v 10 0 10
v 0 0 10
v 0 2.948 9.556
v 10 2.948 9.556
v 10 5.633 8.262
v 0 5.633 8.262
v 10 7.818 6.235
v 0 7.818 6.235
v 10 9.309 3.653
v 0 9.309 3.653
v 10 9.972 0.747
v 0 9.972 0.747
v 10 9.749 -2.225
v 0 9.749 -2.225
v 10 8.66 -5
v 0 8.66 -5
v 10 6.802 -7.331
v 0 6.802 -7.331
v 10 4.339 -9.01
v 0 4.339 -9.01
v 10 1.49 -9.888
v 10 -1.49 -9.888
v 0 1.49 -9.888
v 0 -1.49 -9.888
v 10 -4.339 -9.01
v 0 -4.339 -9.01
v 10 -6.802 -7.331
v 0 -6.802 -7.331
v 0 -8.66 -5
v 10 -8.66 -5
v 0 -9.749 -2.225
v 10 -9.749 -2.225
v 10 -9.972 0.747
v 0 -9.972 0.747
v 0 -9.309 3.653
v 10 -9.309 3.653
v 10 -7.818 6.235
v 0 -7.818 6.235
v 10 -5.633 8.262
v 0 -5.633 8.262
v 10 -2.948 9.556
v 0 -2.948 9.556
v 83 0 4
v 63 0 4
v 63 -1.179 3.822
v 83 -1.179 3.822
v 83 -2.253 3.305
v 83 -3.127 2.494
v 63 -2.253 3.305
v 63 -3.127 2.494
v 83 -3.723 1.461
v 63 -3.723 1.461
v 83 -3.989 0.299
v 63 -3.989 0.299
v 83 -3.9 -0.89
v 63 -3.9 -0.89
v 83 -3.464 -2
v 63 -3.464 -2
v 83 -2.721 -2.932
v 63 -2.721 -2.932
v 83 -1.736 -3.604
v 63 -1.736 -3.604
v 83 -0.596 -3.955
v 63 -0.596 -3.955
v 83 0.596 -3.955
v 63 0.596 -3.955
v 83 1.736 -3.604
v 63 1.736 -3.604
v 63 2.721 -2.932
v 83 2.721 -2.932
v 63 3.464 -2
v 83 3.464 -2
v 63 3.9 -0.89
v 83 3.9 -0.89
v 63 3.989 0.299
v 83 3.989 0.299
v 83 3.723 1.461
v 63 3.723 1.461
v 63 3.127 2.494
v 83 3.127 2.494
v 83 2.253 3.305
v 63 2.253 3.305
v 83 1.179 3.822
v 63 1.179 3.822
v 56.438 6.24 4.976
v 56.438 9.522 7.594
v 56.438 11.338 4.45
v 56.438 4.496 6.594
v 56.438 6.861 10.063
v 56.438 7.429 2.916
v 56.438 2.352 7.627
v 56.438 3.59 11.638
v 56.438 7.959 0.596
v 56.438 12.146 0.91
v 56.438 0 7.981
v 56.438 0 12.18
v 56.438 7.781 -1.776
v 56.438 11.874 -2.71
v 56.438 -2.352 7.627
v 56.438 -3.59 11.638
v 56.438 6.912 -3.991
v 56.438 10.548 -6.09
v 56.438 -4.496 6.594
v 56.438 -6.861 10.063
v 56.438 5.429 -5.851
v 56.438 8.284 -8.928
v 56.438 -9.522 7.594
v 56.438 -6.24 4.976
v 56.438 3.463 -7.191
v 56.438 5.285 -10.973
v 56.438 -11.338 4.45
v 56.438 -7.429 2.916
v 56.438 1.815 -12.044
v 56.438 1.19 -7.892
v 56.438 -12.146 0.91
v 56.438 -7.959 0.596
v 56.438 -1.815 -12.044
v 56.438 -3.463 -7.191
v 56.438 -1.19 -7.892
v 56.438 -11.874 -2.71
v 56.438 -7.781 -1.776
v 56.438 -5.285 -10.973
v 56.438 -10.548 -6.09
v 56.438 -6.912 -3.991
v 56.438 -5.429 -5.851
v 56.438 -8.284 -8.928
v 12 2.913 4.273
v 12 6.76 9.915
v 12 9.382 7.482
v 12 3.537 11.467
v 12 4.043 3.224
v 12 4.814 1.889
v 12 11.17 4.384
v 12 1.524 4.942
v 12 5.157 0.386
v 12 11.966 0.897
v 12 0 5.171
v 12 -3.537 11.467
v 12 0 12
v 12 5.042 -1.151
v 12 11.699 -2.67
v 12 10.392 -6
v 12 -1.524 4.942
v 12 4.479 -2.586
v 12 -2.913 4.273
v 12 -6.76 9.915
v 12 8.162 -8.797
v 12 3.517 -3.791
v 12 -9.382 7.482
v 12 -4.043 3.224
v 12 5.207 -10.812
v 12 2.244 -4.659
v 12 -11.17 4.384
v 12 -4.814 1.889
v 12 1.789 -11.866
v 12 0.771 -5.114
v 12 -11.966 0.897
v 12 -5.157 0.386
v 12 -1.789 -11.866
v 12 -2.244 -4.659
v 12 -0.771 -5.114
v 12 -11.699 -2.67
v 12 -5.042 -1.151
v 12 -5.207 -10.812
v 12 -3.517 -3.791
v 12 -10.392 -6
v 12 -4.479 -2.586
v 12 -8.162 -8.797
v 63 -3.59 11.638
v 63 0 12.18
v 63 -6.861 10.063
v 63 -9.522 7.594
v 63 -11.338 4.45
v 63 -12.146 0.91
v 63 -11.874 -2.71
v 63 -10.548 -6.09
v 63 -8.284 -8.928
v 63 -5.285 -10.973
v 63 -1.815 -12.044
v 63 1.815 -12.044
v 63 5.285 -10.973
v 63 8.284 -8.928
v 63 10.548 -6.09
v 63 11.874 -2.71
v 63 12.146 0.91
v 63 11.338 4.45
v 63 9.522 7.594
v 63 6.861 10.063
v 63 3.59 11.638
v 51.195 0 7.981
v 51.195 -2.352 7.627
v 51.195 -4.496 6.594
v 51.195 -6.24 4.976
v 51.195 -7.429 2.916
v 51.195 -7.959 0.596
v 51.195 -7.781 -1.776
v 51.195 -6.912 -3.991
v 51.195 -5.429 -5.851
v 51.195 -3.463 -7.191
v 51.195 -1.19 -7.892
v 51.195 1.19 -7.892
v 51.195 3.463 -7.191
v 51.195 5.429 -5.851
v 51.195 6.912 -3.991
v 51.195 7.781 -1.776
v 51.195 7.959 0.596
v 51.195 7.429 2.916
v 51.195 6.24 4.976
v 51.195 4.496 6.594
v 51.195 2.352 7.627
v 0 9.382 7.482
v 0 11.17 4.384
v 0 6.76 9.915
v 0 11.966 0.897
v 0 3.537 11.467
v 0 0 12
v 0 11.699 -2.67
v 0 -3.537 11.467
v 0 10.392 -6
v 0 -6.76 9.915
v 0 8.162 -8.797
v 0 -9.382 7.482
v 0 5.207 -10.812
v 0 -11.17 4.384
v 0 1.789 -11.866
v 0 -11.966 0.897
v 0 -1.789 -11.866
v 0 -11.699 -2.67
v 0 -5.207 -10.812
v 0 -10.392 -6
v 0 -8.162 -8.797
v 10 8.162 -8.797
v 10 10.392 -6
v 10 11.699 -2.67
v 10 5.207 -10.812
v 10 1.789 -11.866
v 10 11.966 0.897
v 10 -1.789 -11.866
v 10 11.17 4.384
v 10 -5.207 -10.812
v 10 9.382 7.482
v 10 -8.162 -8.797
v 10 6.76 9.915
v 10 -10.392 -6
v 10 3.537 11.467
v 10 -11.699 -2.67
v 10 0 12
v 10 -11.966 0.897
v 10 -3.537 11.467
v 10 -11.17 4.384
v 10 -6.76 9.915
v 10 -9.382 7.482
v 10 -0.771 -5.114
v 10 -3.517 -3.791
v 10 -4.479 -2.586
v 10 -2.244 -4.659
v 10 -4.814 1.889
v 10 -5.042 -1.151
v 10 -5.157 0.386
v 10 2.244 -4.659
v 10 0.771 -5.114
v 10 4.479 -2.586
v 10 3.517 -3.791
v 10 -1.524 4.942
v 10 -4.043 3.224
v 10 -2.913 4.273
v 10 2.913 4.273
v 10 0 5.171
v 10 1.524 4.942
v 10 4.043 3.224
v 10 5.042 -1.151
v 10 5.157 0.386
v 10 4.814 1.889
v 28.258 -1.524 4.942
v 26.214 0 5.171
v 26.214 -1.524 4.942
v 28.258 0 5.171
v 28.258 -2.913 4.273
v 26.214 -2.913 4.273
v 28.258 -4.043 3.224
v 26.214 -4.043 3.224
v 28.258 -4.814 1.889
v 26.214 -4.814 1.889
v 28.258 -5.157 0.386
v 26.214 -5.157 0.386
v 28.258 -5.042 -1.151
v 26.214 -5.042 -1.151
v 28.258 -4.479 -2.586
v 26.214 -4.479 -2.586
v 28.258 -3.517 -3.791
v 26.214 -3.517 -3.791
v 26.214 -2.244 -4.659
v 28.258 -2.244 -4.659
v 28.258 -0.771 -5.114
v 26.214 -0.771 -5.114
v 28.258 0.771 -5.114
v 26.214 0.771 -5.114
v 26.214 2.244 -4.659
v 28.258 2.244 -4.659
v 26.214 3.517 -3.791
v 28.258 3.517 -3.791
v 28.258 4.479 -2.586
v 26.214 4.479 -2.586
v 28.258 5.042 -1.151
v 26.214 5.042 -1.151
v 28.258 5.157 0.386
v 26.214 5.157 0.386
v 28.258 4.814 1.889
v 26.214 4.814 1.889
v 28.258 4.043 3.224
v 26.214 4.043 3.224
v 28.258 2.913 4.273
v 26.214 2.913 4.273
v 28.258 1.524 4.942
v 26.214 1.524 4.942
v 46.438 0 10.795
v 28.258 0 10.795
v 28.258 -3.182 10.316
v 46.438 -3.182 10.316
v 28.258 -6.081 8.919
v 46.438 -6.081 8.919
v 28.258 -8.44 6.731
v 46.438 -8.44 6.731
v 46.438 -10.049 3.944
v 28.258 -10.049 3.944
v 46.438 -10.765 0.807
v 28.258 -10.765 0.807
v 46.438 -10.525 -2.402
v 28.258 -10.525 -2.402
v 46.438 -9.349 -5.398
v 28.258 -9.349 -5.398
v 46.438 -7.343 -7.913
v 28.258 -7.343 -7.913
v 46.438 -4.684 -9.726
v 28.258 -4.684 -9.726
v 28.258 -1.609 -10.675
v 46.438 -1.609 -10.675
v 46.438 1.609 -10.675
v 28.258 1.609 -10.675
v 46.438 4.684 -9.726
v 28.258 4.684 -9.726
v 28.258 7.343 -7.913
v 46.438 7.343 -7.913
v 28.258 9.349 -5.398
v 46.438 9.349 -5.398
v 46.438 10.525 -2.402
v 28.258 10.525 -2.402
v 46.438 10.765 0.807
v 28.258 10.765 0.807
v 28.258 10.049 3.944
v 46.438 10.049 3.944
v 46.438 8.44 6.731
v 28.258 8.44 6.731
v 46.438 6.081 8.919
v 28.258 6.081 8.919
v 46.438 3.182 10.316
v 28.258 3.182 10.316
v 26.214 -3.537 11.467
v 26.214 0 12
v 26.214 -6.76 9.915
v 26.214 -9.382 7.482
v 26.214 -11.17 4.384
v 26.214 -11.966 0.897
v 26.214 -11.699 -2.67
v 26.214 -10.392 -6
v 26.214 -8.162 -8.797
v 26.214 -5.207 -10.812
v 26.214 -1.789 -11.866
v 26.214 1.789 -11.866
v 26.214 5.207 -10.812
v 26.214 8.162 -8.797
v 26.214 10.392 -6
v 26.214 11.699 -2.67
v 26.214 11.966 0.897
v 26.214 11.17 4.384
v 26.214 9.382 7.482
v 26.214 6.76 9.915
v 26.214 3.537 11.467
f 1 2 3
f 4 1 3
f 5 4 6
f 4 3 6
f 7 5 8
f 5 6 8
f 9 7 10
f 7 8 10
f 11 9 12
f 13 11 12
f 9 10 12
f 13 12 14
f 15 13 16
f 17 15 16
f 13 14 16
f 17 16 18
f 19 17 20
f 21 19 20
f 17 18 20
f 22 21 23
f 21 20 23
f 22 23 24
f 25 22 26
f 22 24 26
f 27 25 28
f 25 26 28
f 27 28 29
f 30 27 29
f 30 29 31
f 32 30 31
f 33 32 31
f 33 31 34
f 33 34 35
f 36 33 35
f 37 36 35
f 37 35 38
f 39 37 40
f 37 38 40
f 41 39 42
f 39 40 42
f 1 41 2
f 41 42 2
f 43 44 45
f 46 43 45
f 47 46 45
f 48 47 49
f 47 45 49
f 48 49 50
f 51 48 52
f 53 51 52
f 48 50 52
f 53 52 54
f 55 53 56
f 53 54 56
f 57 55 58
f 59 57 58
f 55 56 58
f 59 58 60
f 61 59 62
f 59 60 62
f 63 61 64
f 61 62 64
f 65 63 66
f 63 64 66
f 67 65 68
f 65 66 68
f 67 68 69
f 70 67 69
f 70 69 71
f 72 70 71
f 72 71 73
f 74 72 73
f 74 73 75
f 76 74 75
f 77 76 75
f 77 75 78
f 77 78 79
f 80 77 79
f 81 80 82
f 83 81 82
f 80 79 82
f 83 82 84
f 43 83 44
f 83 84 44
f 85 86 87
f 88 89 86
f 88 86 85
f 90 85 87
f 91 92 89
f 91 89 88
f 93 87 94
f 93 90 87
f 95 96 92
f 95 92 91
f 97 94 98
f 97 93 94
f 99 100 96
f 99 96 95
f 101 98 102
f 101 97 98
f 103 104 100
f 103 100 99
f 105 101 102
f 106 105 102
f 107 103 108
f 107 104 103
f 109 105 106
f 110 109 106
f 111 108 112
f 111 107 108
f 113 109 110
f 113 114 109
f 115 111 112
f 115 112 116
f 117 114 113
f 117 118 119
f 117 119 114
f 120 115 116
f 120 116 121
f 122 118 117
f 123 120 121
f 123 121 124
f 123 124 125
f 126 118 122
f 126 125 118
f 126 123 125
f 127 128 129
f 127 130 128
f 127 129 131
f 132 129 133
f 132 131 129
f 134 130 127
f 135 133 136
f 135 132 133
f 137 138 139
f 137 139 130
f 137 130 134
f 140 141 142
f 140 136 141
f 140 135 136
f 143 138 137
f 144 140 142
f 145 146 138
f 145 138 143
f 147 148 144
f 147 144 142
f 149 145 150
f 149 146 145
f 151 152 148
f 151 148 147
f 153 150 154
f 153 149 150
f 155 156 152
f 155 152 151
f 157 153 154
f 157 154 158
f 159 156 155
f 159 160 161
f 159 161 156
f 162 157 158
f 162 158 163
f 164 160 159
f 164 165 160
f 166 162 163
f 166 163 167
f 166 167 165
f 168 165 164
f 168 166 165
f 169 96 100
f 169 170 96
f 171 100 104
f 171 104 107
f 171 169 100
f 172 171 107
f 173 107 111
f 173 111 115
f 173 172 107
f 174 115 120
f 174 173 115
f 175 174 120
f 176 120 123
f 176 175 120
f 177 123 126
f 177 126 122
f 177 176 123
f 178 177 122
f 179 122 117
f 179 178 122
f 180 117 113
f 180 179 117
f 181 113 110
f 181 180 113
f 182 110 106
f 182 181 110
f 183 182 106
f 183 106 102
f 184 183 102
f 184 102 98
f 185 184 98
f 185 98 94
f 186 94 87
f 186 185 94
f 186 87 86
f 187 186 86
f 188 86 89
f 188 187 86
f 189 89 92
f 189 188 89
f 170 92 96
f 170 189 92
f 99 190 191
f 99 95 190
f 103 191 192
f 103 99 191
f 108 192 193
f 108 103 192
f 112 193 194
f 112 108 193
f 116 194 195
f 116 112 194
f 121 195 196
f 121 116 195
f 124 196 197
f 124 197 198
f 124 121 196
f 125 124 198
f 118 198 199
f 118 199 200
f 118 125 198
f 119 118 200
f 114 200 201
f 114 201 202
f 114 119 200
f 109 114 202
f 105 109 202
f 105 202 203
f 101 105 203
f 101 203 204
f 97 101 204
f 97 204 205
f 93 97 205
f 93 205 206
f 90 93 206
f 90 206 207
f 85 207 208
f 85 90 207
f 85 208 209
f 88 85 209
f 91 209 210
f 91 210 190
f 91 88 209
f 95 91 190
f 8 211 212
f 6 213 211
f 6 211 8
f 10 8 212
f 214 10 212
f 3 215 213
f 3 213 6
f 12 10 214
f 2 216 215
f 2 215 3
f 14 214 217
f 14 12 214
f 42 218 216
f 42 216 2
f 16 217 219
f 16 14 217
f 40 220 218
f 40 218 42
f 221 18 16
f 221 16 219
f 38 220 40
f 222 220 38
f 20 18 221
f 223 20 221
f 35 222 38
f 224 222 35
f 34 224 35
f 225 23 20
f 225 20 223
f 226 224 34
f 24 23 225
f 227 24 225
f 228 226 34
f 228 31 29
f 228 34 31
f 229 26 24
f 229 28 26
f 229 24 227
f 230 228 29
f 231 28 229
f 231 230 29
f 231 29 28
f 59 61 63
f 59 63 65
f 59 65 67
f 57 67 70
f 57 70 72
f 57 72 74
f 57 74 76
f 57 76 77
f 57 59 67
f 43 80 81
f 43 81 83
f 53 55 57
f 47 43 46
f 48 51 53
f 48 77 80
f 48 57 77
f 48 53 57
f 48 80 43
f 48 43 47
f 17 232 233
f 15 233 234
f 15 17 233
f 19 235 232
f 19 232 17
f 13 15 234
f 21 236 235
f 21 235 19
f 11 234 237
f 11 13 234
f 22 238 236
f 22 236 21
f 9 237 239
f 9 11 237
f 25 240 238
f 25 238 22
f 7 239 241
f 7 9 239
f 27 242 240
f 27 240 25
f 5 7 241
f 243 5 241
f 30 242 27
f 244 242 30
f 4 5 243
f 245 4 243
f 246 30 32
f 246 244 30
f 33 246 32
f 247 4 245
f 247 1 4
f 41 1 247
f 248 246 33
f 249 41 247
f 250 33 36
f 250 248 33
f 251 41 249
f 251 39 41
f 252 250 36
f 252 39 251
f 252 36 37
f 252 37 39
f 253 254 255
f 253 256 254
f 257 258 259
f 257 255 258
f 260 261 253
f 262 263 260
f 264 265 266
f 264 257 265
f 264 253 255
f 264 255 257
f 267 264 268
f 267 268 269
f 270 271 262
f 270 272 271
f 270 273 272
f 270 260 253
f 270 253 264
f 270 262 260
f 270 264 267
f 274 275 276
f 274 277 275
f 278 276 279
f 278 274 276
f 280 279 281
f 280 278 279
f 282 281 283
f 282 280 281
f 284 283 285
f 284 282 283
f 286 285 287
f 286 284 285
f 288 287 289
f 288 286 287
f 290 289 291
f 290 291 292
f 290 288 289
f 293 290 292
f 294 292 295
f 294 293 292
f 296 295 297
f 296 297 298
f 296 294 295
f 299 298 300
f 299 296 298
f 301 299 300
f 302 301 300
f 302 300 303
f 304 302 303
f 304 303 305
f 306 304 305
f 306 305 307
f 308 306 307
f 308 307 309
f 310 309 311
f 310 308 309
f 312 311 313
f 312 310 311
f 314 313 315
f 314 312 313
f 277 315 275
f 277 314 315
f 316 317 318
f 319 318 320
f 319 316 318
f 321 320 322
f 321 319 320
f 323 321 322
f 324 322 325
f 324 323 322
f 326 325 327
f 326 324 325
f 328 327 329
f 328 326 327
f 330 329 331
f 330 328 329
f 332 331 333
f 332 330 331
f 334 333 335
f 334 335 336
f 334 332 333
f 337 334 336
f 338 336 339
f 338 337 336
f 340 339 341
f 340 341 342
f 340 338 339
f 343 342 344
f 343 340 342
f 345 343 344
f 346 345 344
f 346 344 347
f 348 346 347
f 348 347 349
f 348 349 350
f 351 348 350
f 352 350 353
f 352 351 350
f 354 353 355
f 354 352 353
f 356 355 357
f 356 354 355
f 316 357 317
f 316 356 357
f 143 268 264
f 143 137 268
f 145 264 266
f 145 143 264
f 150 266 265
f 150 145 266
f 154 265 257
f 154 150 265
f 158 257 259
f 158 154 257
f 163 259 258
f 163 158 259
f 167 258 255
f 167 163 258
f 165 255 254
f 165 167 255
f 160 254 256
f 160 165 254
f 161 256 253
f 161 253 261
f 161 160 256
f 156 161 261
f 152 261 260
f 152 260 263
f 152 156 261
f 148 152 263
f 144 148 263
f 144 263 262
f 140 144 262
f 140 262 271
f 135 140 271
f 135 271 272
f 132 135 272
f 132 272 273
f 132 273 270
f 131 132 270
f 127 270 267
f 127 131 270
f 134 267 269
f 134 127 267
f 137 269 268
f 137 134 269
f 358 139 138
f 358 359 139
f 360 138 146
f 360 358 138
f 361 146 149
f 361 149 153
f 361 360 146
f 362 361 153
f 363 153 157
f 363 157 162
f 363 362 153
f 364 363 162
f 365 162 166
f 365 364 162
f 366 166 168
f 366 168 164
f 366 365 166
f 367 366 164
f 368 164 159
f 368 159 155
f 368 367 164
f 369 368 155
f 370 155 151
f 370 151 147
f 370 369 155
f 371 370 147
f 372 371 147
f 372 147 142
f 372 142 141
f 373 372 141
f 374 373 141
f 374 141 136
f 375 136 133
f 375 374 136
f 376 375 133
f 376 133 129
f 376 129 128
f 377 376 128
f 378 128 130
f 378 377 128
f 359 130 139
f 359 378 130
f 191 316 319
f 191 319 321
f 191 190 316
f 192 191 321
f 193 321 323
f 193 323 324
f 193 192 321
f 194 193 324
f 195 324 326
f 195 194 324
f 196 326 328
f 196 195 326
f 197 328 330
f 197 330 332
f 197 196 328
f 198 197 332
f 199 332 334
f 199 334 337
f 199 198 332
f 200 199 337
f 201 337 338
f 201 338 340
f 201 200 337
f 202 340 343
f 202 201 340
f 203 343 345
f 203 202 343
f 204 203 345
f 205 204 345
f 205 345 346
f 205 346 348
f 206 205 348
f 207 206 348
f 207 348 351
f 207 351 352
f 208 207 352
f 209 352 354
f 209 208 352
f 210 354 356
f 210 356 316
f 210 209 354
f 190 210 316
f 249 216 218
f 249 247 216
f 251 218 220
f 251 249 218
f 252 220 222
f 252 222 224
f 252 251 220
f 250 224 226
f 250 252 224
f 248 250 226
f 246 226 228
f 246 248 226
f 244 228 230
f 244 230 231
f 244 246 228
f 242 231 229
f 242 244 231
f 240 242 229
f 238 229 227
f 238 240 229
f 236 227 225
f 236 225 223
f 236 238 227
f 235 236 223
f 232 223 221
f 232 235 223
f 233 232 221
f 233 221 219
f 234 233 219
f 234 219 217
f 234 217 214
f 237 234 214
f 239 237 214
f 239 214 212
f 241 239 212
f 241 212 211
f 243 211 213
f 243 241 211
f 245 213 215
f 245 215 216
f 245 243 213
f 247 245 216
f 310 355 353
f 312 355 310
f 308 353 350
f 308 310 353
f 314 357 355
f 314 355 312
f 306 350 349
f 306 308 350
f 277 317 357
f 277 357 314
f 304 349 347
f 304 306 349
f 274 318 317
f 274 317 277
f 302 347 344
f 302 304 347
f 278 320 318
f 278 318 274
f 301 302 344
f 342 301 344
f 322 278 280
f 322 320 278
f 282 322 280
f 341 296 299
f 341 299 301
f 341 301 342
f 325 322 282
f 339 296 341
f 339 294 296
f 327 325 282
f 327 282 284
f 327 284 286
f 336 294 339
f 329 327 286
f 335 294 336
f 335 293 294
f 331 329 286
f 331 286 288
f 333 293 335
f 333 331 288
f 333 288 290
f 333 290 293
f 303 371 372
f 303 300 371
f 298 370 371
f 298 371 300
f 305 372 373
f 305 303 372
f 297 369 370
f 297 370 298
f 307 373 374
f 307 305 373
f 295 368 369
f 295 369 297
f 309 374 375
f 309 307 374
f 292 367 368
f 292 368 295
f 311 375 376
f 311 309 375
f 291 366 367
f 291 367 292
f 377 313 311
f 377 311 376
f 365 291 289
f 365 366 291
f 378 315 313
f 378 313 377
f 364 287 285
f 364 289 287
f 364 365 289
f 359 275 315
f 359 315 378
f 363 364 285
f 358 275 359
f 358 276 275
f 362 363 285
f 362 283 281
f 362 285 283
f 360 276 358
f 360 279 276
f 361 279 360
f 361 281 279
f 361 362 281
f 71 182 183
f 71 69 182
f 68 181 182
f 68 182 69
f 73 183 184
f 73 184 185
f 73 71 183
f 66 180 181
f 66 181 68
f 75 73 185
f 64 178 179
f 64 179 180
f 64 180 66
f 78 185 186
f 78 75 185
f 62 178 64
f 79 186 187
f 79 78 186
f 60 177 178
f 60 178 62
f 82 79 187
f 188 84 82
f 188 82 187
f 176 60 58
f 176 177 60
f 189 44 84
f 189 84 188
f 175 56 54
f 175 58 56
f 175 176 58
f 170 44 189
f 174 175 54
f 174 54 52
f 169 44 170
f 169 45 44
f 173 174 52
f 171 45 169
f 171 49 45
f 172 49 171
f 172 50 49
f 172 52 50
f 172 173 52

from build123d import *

# Parameters (mm, degrees)
SKETCH_2_R          = 10
CUT_EXTRUDE_1_DEPTH = 10
SKETCH_3_R          = 4
EXTRUDE_1_DEPTH     = 20


with BuildPart() as part:
    # 草图1 → 旋转1 (revolve)
    with BuildSketch(Plane.XY, mode=Mode.PRIVATE) as revolve_1_sk:
        Polygon((0, 0), (0, 12), (10, 12), (10, 5.171378426), (12, 5.171378426), (12, 12), (26.213590289, 12), (26.213590289, 5.171378426), (28.258117979, 5.171378426), (28.258117979, 10.795188001), (46.438305119, 10.795188001), (51.194621956, 7.981109143), (56.437846762, 7.981109143), (56.437846762, 12.17955734), (63, 12.17955734), (63, 0), align=None)
    revolve(revolve_1_sk.sketch.rotate(Axis((0, 0, 0), (1, 0, 0)), 90), axis=Axis((0, 0, 0), (1, 0, 0)))

    # 草图2 → 切除-拉伸1 (cut)
    with BuildSketch(Plane.ZY):
        Circle(SKETCH_2_R)
    extrude(amount=-CUT_EXTRUDE_1_DEPTH, mode=Mode.SUBTRACT)


with BuildPart() as cut_extrude_1_piece_1:
    # of the separate pieces the step leaves, piece 1, a body of its own (cut_extrude_1_pieces)
    add(part.part.solids().sort_by_distance((10, 0, 5.171378426))[0])

    # 草图3 → 凸台-拉伸1 (add)
    with BuildSketch(Plane(origin=(63, 0, 0), x_dir=(0, 0, -1), z_dir=(1, 0, 0))):
        with Locations(Location((0, 0, 0), (0, 0, 180))):
            Circle(SKETCH_3_R)
    extrude(amount=EXTRUDE_1_DEPTH)


with BuildPart() as cut_extrude_1_piece_2:
    # of the separate pieces the step leaves, piece 2, a body of its own (cut_extrude_1_pieces)
    add(part.part.solids().sort_by_distance((0, 0, 12))[0])


solid = Compound([cut_extrude_1_piece_1.part, cut_extrude_1_piece_2.part])
